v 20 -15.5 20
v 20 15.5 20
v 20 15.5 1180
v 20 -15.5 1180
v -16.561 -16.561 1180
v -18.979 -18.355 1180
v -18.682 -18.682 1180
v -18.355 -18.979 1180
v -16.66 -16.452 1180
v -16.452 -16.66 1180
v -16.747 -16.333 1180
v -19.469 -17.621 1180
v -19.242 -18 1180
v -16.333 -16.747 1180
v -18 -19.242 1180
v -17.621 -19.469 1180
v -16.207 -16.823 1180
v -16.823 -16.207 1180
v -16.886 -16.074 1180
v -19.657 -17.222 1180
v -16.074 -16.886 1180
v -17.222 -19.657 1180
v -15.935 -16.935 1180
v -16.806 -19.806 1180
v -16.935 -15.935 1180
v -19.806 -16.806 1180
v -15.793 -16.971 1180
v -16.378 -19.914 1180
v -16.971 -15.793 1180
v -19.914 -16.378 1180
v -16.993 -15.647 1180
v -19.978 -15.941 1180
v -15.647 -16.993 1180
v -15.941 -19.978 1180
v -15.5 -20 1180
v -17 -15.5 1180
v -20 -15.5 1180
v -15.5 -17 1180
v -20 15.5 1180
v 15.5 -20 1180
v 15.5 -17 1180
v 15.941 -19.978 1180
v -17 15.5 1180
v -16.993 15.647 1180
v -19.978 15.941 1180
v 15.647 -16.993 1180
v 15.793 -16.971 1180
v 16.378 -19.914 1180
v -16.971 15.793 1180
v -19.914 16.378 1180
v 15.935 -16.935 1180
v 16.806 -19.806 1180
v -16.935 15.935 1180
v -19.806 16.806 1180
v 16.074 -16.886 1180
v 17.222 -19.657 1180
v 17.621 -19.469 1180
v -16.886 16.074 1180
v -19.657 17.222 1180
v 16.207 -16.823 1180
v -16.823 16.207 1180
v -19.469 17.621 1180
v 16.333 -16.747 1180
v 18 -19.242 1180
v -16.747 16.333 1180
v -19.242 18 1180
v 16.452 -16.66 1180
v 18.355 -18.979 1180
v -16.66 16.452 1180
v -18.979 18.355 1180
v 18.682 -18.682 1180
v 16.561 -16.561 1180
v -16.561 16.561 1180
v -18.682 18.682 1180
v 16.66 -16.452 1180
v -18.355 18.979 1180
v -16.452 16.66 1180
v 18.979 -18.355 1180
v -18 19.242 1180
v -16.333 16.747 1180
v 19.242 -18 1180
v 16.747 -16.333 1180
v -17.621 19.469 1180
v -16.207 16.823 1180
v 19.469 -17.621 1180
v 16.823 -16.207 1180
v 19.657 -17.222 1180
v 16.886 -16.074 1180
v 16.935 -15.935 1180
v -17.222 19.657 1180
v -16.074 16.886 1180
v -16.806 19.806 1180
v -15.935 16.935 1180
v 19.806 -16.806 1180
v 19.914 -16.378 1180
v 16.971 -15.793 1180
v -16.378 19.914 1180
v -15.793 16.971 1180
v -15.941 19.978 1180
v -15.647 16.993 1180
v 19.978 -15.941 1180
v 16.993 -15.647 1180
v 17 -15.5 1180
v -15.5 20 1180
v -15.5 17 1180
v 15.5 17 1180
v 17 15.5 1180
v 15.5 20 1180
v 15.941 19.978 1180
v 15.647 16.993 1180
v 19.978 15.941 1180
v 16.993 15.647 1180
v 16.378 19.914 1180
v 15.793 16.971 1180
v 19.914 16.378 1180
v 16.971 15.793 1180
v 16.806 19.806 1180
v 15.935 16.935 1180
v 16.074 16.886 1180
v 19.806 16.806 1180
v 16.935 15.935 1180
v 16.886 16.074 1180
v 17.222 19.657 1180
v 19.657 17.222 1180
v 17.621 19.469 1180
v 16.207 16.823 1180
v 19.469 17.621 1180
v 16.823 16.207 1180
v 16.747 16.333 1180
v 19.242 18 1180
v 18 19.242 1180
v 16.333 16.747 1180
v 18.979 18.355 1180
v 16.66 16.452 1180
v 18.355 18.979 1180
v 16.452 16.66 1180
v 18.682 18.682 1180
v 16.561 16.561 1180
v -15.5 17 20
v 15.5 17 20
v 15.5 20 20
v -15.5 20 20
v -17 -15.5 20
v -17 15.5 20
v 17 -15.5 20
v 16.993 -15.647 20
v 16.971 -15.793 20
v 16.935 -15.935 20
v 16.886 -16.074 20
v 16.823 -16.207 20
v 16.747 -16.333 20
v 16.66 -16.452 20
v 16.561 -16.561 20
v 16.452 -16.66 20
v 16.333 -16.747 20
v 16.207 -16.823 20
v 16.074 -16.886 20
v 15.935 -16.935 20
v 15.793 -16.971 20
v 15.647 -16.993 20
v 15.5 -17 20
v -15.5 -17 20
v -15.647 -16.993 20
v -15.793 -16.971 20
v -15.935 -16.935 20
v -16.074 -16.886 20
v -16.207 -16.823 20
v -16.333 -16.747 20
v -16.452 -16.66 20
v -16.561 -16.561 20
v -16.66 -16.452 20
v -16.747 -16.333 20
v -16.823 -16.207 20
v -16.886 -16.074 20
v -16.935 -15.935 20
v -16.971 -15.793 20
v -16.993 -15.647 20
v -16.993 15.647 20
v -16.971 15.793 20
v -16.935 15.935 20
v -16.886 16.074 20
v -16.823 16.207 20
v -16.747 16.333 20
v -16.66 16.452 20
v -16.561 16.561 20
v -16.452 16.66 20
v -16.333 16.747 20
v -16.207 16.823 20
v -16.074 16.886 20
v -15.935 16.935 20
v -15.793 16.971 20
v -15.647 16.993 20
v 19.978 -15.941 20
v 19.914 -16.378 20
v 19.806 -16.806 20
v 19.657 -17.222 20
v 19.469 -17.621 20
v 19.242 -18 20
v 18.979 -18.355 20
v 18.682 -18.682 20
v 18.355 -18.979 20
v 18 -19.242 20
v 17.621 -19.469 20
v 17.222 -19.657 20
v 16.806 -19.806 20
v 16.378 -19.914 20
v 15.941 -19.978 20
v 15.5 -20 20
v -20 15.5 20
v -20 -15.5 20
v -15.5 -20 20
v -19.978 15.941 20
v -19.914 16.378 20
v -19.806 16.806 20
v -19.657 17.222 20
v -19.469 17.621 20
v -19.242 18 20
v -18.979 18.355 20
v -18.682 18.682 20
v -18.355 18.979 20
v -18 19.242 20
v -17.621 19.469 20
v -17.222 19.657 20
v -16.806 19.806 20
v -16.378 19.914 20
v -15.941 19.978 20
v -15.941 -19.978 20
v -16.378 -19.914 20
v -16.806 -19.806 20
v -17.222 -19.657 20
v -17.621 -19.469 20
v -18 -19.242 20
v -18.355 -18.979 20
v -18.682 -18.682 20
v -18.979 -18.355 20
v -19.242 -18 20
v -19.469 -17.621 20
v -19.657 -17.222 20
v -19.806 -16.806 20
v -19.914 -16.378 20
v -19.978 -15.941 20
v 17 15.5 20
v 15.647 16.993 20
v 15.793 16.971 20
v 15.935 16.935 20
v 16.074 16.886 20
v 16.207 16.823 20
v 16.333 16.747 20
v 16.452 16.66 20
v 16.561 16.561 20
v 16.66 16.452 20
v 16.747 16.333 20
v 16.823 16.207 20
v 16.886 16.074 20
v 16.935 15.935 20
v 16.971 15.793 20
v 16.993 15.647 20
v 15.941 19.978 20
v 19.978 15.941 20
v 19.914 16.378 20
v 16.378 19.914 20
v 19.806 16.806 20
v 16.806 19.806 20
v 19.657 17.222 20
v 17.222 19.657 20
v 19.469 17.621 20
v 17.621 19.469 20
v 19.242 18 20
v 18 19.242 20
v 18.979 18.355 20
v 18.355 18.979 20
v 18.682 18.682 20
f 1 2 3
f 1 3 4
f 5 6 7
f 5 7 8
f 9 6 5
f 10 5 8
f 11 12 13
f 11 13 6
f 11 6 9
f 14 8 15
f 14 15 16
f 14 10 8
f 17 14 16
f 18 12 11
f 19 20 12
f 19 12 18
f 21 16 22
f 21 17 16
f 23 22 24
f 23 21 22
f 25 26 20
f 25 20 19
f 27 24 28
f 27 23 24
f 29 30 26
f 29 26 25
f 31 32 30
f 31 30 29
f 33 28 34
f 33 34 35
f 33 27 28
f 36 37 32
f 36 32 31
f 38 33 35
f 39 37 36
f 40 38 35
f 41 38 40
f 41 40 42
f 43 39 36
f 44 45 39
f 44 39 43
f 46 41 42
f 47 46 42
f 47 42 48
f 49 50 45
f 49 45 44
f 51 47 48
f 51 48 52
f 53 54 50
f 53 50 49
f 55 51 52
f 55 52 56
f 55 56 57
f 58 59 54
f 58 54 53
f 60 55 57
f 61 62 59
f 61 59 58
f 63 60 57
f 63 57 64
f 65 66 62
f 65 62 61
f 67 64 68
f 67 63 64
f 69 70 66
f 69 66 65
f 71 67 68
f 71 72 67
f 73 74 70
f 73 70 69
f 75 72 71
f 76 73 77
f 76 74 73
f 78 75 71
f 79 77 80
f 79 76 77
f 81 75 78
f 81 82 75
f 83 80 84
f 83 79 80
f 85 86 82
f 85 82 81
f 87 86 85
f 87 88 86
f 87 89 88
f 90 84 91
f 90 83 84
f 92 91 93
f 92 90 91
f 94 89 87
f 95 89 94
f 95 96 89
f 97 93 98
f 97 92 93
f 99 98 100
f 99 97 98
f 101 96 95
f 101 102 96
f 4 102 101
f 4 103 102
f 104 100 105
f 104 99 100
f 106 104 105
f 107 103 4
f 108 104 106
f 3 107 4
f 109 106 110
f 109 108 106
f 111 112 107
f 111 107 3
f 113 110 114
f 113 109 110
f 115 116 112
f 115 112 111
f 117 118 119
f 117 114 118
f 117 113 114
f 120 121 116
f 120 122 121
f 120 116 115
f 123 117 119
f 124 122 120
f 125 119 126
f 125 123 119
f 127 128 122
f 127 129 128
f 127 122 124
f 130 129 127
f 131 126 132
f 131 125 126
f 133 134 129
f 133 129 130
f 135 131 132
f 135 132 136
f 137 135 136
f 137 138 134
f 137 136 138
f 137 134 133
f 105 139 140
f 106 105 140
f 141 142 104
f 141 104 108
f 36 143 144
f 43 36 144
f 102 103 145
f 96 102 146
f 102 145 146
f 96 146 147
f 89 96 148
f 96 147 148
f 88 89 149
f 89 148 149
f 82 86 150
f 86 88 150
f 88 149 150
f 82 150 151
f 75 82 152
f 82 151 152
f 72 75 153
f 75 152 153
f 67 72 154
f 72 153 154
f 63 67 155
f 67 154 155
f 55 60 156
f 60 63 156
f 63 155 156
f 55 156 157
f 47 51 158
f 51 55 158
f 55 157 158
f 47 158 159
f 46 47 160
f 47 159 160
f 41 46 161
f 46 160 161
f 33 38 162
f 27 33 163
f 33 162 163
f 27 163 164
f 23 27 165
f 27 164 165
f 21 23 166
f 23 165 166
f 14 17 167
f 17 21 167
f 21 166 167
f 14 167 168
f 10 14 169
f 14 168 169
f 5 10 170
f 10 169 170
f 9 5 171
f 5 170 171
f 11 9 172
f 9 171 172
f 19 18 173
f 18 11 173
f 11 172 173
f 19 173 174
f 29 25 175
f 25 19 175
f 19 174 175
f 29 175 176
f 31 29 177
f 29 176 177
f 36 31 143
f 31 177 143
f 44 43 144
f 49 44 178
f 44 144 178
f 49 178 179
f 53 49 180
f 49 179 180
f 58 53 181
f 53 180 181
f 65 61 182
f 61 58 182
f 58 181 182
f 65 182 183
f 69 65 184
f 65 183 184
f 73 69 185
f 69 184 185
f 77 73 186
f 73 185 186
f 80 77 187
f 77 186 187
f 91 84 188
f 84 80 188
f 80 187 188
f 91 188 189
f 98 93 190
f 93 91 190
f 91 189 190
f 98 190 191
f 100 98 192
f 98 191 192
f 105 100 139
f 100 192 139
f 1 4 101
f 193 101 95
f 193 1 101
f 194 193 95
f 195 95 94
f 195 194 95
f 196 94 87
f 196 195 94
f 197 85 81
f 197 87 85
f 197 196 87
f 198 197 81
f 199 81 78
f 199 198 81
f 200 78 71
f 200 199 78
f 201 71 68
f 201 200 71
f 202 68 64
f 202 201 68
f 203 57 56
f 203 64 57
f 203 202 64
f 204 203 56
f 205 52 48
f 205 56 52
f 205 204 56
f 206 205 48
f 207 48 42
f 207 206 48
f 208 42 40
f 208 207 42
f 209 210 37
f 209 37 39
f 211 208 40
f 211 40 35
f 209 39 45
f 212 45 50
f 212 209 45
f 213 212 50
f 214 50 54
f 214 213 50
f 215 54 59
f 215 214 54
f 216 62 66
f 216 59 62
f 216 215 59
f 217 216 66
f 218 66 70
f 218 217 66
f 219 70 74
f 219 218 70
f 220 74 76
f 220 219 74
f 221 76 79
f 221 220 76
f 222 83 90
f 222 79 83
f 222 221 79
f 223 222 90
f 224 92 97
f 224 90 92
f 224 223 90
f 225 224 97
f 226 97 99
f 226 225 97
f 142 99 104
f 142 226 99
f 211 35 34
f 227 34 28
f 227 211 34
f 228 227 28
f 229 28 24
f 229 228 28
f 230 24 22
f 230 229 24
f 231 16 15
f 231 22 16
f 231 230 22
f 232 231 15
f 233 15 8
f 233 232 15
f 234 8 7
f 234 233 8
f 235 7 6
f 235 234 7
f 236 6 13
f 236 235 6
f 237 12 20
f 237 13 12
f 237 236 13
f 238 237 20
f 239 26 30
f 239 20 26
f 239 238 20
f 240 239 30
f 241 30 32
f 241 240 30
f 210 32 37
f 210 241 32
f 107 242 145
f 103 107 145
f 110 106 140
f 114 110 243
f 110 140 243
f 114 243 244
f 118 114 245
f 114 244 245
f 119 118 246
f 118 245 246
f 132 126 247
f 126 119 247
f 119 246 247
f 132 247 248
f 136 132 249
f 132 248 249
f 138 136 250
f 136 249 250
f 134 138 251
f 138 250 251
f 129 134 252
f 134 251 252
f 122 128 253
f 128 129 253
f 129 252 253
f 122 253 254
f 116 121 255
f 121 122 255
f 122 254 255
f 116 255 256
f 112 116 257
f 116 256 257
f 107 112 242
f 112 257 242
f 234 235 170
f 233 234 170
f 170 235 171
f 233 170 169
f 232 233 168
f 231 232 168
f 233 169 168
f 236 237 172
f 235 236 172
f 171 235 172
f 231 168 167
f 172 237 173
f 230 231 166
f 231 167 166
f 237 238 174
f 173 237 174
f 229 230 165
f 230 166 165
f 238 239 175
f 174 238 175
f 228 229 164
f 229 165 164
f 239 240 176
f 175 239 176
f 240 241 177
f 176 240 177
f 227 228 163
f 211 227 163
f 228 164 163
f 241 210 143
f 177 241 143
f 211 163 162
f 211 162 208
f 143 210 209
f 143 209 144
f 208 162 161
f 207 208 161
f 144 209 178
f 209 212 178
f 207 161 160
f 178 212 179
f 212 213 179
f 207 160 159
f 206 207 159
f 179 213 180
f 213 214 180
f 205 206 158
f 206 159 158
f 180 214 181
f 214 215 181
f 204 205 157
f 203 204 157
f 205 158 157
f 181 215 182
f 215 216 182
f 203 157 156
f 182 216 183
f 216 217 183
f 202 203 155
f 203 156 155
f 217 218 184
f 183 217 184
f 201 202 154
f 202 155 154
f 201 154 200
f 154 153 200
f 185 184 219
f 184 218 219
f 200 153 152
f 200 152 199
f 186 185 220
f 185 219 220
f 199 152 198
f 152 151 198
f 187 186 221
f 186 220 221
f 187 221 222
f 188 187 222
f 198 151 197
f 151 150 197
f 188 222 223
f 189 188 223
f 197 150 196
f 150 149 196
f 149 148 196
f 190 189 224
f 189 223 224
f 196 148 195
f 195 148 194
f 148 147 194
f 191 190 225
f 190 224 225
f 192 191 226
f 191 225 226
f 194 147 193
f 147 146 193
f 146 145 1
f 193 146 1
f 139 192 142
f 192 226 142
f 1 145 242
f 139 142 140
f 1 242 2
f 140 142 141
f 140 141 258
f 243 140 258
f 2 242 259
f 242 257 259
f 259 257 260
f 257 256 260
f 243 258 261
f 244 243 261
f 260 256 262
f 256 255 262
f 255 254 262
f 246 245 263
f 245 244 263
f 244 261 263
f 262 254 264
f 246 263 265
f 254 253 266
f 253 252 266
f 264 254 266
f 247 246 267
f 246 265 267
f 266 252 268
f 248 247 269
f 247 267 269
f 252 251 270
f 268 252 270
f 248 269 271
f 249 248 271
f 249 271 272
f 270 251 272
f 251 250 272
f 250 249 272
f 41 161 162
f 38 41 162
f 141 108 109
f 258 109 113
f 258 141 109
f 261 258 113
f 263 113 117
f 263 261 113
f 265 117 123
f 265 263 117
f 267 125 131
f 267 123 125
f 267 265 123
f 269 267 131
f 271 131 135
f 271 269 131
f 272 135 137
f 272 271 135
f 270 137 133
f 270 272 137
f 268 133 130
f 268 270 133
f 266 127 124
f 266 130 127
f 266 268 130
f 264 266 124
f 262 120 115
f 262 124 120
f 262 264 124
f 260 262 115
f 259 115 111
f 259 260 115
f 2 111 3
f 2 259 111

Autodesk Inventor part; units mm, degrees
ref_plane "Start Plane" through (0, 0, 20) normal (0, 0, 1) x (1, 0, 0)
ref_plane "End Plane" through (0, 0, 1180) normal (0, 0, 1) x (1, 0, 0)
sketch "Sketch" plane through (0, 0, 0) normal (0, 0, 1) x (1, 0, 0)
  line L0 (-20, -15.5) -> (-20, 15.5)
  line L1 (-15.5, 20) -> (15.5, 20)
  line L2 (20, 15.5) -> (20, -15.5)
  line L3 (15.5, -20) -> (-15.5, -20)
  arc A0 (-20, -15.5) -> (-15.5, -20) centre (-15.5, -15.5) ccw
  arc A1 (-15.5, 20) -> (-20, 15.5) centre (-15.5, 15.5) ccw
  arc A2 (20, 15.5) -> (15.5, 20) centre (15.5, 15.5) ccw
  arc A3 (15.5, -20) -> (20, -15.5) centre (15.5, -15.5) ccw
  arc A4 (-15.5, 17) -> (-17, 15.5) centre (-15.5, 15.5) ccw
  line L4 (-15.5, 17) -> (15.5, 17)
  arc A5 (17, 15.5) -> (15.5, 17) centre (15.5, 15.5) ccw
  line L5 (17, 15.5) -> (17, -15.5)
  arc A6 (15.5, -17) -> (17, -15.5) centre (15.5, -15.5) ccw
  line L6 (15.5, -17) -> (-15.5, -17)
  arc A7 (-17, -15.5) -> (-15.5, -17) centre (-15.5, -15.5) ccw
  line L7 (-17, -15.5) -> (-17, 15.5)
  line L8 (0, 29.3048) -> (0, -29.3048) construction
  line L9 (-29.3048, 0) -> (29.3048, 0) construction
  dimension "d7" = 4.5
  dimension "d10" = 40
  dimension "d11" = 40
  dimension "d12" = 3
  dimension "d15" = 20
  dimension "d16" = 20
extrude "Body" add sketch "Sketch" along normal up to surface (1160 mm away) from surface at 20
sketch "Sketch3" plane through (0, 0, 0) normal (0, 0, 1) x (1, 0, 0)
  line L0 (0, 0) -> (10, 0)
ref_plane "Work Plane3" through (0, 0, 0) normal (0, -1, 0) x (1, 0, 0)
ref_plane "Work Plane4" through (-800, -15.5, 20) normal (0, 0, -1) x (-1, 0, 0)
split "Split1" plane through (-800, -15.5, 20) removes the side toward (0, 0, -1)
ref_plane "Work Plane5" through (-500, -984.5, 1180) normal (0, 0, 1) x (1, 0, 0)
split "Split2" plane through (-500, -984.5, 1180) removes the side toward (0, 0, 1)
sketch "Sketch4" plane through (0, 0, 0) normal (0, -1, 0) x (1, 0, 0)
  line L0 (-2, 20) -> (12, 20) projected
  line L1 (-2, 1180) -> (12, 1180) projected
  dimension "d18" = 1160
equation "\"d7\" = G_IR"
equation "\"d10\" = G_H"
equation "\"d11\" = G_W"
equation "\"d12\" = G_T"
equation "\"d15\" = 0.5 * d10"
equation "\"d16\" = 0.5 * d11"
equation "\"d3\" = G_L"
equation "\"G_W\" = 40"
equation "\"G_H\" = 40"
equation "\"G_T\" = 3"
equation "\"G_IR\" = 4.5"
equation "\"G_L\" = d18"
properties part number "ISO 12633-2 - 40x40x3 - 1160" material "Steel, Mild"
